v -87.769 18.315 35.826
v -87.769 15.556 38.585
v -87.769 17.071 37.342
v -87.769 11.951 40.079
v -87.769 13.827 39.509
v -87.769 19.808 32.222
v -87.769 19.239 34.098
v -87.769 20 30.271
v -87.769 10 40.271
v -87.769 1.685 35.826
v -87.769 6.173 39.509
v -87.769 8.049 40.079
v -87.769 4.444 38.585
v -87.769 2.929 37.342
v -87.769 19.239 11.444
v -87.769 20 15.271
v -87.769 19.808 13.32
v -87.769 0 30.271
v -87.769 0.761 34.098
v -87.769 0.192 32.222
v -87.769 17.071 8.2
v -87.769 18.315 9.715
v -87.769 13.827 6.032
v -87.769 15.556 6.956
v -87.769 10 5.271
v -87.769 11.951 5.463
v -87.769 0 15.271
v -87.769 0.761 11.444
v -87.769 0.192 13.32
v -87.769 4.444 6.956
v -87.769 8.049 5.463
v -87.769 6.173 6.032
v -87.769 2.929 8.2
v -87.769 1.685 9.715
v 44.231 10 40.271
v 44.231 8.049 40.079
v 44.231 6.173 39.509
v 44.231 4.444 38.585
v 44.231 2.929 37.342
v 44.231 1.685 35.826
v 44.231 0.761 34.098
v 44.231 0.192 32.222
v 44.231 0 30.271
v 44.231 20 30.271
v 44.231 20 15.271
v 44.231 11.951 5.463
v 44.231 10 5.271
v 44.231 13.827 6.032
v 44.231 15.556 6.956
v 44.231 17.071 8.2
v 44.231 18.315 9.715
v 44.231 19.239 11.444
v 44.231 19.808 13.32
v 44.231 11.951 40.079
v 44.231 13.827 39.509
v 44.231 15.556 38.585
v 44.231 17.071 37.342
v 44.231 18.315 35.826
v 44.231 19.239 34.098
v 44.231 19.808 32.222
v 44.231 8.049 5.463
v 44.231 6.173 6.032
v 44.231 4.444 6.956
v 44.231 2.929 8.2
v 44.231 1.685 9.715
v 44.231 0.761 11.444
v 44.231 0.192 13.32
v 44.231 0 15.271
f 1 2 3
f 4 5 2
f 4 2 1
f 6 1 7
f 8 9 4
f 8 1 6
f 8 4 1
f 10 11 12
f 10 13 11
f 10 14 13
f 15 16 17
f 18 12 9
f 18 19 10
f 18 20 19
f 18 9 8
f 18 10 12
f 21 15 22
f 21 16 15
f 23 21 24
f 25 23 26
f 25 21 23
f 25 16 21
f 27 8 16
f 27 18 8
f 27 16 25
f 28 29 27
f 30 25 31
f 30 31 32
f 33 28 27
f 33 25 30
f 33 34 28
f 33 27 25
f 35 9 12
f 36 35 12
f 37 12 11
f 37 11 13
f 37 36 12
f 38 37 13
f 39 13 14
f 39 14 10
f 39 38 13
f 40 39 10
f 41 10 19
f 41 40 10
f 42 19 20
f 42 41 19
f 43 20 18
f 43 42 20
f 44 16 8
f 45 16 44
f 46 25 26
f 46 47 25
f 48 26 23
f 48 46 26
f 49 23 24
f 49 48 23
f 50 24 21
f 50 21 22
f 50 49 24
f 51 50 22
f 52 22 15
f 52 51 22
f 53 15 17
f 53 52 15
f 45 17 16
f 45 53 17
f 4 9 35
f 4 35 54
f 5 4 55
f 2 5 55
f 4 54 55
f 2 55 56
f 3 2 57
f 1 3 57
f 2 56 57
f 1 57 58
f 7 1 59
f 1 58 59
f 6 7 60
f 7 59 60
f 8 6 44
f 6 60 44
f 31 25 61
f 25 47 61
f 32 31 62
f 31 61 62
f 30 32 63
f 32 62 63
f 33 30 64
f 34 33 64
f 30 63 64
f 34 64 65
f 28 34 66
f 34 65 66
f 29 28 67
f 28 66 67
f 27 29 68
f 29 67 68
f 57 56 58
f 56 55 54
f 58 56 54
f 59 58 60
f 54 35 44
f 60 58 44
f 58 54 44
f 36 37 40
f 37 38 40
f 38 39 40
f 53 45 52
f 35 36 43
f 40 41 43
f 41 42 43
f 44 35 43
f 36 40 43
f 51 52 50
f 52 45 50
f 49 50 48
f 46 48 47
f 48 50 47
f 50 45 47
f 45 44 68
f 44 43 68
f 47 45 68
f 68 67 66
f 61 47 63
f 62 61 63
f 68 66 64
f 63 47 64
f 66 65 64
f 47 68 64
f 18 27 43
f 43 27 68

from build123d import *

# Parameters (mm, degrees)
SKETCH2_W           = 132
SKETCH2_H           = 35
BOSS_EXTRUDE1_DEPTH = 20
FILLET1_R           = 10


with BuildPart() as part:
    # Sketch2 → Boss-Extrude1 (new body)
    with BuildSketch(Plane(origin=(0, 0, 0), x_dir=(1, 0, 0), z_dir=(0, 1, 0))):
        with Locations((-21.769456002, -22.770691578)):
            Rectangle(SKETCH2_W, SKETCH2_H)
    extrude(amount=BOSS_EXTRUDE1_DEPTH)

    # Fillet1
    fillet1_edges = [part.edges().sort_by_distance(p)[0] for p in [
        (-21.769456002, 0, 40.270691578),
        (-21.769456002, 0, 5.270691578),
        (-21.769456002, 20, 5.270691578),
        (-21.769456002, 20, 40.270691578),
    ]]
    fillet(fillet1_edges, radius=FILLET1_R - 0.0001)  # a hair under: the kernel refuses the full size


solid = part.part
